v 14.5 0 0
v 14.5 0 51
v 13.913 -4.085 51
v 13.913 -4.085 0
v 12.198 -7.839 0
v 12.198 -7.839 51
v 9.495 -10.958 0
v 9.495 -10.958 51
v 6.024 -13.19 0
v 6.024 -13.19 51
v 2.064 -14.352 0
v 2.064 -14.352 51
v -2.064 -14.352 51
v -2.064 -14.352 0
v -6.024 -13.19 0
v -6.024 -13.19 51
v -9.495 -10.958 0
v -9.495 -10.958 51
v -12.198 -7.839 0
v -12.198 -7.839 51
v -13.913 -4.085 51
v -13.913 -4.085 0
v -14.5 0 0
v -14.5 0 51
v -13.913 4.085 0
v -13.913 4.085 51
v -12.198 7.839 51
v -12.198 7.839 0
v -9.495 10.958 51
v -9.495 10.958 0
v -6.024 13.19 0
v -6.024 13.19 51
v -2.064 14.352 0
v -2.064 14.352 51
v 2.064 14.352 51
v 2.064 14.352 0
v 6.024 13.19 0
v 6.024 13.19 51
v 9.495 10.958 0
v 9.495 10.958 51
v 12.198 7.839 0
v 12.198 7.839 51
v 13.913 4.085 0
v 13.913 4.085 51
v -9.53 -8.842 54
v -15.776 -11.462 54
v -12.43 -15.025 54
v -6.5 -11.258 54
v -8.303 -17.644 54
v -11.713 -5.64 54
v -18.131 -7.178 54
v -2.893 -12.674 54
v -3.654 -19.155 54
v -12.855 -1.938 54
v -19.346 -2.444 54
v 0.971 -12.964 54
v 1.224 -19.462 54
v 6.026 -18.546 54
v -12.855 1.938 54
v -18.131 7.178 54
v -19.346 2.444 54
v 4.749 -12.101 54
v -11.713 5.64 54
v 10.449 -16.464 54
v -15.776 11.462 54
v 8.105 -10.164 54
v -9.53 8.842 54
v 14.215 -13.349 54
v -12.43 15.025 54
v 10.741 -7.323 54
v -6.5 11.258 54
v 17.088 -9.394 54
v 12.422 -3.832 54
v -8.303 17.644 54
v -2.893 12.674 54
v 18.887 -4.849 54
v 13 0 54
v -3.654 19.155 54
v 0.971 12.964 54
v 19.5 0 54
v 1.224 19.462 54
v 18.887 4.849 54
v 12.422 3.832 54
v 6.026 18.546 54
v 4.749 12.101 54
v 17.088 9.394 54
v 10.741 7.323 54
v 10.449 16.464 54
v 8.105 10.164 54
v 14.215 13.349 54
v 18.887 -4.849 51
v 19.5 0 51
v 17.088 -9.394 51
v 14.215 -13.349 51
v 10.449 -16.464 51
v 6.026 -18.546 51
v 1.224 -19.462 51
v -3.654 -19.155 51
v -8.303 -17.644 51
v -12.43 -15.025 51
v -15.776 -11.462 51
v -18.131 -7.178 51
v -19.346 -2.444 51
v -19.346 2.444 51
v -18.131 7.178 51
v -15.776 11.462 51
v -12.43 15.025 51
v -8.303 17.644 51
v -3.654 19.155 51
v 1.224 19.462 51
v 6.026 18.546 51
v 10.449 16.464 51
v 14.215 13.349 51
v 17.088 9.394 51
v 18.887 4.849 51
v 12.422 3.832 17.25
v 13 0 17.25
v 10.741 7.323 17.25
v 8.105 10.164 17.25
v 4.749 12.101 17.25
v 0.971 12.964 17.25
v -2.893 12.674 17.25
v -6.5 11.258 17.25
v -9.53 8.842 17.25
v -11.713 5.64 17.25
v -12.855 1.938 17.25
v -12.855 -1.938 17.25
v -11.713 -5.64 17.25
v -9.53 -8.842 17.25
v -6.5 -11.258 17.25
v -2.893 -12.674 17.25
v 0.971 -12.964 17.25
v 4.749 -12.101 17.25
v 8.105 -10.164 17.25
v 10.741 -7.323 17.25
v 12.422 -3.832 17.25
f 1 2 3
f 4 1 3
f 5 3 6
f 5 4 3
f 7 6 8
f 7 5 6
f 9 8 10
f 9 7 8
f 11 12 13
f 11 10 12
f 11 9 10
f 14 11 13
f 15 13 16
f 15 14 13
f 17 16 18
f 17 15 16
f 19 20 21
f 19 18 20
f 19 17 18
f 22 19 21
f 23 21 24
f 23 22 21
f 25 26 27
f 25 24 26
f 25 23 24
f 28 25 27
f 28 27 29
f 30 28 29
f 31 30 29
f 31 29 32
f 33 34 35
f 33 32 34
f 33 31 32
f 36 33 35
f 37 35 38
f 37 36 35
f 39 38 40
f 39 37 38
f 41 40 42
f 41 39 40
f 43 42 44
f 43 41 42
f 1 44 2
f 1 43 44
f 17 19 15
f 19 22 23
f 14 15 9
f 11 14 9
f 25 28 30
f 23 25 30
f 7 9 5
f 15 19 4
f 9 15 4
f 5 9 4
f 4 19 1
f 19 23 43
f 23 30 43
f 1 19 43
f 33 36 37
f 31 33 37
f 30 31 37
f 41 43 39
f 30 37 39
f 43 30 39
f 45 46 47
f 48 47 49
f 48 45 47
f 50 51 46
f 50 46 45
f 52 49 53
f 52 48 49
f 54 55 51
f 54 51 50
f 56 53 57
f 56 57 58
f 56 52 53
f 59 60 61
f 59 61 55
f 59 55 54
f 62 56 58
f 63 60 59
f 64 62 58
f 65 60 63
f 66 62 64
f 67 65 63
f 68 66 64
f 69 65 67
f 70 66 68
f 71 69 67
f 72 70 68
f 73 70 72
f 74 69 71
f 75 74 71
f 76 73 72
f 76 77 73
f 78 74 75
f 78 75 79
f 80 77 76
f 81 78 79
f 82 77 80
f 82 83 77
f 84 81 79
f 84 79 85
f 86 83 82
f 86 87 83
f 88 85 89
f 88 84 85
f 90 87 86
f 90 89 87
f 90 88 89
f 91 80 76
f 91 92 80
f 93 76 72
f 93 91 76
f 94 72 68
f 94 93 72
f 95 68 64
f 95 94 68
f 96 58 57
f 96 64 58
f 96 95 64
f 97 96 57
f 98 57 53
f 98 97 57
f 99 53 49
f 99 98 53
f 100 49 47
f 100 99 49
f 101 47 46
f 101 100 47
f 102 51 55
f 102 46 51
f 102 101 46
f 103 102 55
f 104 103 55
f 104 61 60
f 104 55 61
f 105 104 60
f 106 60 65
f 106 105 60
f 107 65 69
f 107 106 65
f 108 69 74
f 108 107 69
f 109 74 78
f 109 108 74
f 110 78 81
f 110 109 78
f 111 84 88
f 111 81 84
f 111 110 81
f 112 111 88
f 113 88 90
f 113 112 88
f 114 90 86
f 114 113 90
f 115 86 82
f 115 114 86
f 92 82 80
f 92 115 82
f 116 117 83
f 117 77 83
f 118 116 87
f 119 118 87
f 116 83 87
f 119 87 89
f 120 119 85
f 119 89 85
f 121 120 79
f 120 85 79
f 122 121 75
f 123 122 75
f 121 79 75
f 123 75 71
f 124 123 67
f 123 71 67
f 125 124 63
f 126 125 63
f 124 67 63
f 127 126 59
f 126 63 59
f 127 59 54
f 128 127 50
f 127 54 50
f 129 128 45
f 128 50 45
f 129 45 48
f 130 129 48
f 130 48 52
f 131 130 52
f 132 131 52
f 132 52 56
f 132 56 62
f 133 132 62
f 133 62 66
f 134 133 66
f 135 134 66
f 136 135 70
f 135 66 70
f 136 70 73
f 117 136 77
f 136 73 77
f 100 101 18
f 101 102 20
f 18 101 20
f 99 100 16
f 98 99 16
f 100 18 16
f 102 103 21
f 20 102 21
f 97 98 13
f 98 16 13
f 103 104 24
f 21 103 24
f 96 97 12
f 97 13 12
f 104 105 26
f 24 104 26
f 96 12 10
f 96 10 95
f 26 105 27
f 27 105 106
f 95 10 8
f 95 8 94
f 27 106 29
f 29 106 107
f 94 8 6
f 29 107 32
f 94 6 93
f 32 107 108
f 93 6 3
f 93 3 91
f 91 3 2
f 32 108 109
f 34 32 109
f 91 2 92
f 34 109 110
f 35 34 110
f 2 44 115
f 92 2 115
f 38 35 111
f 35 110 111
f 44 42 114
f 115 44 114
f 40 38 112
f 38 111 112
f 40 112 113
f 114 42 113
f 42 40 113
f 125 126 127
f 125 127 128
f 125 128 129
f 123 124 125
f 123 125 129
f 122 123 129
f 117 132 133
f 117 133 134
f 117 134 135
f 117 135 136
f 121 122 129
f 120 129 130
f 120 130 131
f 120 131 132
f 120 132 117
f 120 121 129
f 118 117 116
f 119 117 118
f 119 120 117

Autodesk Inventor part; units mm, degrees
ref_plane "YZ Plane" through (0, 0, 0) normal (1, 0, 0) x (0, 1, 0)
ref_plane "XZ Plane" through (0, 0, 0) normal (0, 1, 0) x (-1, 0, 0)
ref_plane "XY Plane" through (0, 0, 0) normal (0, 0, 1) x (1, 0, 0)
sketch "Sketch1" plane through (0, 0, 0) normal (0, 0, 1) x (1, 0, 0)
  circle A0 centre (0, 0) radius 14.5
  dimension "d0" = 29
extrude "Extrusion1" add sketch "Sketch1" along normal blind 51
sketch "Sketch2" plane through (0, 0, 51) normal (0, 0, 1) x (1, 0, 0)
  circle A0 centre (0, 0) radius 19.5
  circle A1 centre (0, 0) radius 14.5 projected
  dimension "d3" = 5
extrude "Extrusion2" add sketch "Sketch2" along normal blind 3 contours A0 | A1
sketch "Sketch4" plane through (0, 0, 54) normal (0, 0, 1) x (1, 0, 0)
  circle A0 centre (0, 0) radius 13
  dimension "d44" = 26
extrude "Extrusion3" cut sketch "Sketch4" against normal blind 36.75
equation "\"d0\" = r_usboutlet"
equation "\"wl_panel\" = 285"
equation "\"t_panel\" = 8"
equation "\"r_button\" = 8"
equation "\"l_stereo\" = 178"
equation "\"d_stereo\" = 177"
equation "\"w_label\" = 15"
equation "\"r_labelscrew\" = 2.5"
equation "\"ro_labelscrew\" = 5"
equation "\"l_buttontobutton\" = 25"
equation "\"r_usboutlet\" = 29"
equation "\"l_fastener_button\" = 19"
properties part number "usb_outlet" material "Thermoplastic Resin"
